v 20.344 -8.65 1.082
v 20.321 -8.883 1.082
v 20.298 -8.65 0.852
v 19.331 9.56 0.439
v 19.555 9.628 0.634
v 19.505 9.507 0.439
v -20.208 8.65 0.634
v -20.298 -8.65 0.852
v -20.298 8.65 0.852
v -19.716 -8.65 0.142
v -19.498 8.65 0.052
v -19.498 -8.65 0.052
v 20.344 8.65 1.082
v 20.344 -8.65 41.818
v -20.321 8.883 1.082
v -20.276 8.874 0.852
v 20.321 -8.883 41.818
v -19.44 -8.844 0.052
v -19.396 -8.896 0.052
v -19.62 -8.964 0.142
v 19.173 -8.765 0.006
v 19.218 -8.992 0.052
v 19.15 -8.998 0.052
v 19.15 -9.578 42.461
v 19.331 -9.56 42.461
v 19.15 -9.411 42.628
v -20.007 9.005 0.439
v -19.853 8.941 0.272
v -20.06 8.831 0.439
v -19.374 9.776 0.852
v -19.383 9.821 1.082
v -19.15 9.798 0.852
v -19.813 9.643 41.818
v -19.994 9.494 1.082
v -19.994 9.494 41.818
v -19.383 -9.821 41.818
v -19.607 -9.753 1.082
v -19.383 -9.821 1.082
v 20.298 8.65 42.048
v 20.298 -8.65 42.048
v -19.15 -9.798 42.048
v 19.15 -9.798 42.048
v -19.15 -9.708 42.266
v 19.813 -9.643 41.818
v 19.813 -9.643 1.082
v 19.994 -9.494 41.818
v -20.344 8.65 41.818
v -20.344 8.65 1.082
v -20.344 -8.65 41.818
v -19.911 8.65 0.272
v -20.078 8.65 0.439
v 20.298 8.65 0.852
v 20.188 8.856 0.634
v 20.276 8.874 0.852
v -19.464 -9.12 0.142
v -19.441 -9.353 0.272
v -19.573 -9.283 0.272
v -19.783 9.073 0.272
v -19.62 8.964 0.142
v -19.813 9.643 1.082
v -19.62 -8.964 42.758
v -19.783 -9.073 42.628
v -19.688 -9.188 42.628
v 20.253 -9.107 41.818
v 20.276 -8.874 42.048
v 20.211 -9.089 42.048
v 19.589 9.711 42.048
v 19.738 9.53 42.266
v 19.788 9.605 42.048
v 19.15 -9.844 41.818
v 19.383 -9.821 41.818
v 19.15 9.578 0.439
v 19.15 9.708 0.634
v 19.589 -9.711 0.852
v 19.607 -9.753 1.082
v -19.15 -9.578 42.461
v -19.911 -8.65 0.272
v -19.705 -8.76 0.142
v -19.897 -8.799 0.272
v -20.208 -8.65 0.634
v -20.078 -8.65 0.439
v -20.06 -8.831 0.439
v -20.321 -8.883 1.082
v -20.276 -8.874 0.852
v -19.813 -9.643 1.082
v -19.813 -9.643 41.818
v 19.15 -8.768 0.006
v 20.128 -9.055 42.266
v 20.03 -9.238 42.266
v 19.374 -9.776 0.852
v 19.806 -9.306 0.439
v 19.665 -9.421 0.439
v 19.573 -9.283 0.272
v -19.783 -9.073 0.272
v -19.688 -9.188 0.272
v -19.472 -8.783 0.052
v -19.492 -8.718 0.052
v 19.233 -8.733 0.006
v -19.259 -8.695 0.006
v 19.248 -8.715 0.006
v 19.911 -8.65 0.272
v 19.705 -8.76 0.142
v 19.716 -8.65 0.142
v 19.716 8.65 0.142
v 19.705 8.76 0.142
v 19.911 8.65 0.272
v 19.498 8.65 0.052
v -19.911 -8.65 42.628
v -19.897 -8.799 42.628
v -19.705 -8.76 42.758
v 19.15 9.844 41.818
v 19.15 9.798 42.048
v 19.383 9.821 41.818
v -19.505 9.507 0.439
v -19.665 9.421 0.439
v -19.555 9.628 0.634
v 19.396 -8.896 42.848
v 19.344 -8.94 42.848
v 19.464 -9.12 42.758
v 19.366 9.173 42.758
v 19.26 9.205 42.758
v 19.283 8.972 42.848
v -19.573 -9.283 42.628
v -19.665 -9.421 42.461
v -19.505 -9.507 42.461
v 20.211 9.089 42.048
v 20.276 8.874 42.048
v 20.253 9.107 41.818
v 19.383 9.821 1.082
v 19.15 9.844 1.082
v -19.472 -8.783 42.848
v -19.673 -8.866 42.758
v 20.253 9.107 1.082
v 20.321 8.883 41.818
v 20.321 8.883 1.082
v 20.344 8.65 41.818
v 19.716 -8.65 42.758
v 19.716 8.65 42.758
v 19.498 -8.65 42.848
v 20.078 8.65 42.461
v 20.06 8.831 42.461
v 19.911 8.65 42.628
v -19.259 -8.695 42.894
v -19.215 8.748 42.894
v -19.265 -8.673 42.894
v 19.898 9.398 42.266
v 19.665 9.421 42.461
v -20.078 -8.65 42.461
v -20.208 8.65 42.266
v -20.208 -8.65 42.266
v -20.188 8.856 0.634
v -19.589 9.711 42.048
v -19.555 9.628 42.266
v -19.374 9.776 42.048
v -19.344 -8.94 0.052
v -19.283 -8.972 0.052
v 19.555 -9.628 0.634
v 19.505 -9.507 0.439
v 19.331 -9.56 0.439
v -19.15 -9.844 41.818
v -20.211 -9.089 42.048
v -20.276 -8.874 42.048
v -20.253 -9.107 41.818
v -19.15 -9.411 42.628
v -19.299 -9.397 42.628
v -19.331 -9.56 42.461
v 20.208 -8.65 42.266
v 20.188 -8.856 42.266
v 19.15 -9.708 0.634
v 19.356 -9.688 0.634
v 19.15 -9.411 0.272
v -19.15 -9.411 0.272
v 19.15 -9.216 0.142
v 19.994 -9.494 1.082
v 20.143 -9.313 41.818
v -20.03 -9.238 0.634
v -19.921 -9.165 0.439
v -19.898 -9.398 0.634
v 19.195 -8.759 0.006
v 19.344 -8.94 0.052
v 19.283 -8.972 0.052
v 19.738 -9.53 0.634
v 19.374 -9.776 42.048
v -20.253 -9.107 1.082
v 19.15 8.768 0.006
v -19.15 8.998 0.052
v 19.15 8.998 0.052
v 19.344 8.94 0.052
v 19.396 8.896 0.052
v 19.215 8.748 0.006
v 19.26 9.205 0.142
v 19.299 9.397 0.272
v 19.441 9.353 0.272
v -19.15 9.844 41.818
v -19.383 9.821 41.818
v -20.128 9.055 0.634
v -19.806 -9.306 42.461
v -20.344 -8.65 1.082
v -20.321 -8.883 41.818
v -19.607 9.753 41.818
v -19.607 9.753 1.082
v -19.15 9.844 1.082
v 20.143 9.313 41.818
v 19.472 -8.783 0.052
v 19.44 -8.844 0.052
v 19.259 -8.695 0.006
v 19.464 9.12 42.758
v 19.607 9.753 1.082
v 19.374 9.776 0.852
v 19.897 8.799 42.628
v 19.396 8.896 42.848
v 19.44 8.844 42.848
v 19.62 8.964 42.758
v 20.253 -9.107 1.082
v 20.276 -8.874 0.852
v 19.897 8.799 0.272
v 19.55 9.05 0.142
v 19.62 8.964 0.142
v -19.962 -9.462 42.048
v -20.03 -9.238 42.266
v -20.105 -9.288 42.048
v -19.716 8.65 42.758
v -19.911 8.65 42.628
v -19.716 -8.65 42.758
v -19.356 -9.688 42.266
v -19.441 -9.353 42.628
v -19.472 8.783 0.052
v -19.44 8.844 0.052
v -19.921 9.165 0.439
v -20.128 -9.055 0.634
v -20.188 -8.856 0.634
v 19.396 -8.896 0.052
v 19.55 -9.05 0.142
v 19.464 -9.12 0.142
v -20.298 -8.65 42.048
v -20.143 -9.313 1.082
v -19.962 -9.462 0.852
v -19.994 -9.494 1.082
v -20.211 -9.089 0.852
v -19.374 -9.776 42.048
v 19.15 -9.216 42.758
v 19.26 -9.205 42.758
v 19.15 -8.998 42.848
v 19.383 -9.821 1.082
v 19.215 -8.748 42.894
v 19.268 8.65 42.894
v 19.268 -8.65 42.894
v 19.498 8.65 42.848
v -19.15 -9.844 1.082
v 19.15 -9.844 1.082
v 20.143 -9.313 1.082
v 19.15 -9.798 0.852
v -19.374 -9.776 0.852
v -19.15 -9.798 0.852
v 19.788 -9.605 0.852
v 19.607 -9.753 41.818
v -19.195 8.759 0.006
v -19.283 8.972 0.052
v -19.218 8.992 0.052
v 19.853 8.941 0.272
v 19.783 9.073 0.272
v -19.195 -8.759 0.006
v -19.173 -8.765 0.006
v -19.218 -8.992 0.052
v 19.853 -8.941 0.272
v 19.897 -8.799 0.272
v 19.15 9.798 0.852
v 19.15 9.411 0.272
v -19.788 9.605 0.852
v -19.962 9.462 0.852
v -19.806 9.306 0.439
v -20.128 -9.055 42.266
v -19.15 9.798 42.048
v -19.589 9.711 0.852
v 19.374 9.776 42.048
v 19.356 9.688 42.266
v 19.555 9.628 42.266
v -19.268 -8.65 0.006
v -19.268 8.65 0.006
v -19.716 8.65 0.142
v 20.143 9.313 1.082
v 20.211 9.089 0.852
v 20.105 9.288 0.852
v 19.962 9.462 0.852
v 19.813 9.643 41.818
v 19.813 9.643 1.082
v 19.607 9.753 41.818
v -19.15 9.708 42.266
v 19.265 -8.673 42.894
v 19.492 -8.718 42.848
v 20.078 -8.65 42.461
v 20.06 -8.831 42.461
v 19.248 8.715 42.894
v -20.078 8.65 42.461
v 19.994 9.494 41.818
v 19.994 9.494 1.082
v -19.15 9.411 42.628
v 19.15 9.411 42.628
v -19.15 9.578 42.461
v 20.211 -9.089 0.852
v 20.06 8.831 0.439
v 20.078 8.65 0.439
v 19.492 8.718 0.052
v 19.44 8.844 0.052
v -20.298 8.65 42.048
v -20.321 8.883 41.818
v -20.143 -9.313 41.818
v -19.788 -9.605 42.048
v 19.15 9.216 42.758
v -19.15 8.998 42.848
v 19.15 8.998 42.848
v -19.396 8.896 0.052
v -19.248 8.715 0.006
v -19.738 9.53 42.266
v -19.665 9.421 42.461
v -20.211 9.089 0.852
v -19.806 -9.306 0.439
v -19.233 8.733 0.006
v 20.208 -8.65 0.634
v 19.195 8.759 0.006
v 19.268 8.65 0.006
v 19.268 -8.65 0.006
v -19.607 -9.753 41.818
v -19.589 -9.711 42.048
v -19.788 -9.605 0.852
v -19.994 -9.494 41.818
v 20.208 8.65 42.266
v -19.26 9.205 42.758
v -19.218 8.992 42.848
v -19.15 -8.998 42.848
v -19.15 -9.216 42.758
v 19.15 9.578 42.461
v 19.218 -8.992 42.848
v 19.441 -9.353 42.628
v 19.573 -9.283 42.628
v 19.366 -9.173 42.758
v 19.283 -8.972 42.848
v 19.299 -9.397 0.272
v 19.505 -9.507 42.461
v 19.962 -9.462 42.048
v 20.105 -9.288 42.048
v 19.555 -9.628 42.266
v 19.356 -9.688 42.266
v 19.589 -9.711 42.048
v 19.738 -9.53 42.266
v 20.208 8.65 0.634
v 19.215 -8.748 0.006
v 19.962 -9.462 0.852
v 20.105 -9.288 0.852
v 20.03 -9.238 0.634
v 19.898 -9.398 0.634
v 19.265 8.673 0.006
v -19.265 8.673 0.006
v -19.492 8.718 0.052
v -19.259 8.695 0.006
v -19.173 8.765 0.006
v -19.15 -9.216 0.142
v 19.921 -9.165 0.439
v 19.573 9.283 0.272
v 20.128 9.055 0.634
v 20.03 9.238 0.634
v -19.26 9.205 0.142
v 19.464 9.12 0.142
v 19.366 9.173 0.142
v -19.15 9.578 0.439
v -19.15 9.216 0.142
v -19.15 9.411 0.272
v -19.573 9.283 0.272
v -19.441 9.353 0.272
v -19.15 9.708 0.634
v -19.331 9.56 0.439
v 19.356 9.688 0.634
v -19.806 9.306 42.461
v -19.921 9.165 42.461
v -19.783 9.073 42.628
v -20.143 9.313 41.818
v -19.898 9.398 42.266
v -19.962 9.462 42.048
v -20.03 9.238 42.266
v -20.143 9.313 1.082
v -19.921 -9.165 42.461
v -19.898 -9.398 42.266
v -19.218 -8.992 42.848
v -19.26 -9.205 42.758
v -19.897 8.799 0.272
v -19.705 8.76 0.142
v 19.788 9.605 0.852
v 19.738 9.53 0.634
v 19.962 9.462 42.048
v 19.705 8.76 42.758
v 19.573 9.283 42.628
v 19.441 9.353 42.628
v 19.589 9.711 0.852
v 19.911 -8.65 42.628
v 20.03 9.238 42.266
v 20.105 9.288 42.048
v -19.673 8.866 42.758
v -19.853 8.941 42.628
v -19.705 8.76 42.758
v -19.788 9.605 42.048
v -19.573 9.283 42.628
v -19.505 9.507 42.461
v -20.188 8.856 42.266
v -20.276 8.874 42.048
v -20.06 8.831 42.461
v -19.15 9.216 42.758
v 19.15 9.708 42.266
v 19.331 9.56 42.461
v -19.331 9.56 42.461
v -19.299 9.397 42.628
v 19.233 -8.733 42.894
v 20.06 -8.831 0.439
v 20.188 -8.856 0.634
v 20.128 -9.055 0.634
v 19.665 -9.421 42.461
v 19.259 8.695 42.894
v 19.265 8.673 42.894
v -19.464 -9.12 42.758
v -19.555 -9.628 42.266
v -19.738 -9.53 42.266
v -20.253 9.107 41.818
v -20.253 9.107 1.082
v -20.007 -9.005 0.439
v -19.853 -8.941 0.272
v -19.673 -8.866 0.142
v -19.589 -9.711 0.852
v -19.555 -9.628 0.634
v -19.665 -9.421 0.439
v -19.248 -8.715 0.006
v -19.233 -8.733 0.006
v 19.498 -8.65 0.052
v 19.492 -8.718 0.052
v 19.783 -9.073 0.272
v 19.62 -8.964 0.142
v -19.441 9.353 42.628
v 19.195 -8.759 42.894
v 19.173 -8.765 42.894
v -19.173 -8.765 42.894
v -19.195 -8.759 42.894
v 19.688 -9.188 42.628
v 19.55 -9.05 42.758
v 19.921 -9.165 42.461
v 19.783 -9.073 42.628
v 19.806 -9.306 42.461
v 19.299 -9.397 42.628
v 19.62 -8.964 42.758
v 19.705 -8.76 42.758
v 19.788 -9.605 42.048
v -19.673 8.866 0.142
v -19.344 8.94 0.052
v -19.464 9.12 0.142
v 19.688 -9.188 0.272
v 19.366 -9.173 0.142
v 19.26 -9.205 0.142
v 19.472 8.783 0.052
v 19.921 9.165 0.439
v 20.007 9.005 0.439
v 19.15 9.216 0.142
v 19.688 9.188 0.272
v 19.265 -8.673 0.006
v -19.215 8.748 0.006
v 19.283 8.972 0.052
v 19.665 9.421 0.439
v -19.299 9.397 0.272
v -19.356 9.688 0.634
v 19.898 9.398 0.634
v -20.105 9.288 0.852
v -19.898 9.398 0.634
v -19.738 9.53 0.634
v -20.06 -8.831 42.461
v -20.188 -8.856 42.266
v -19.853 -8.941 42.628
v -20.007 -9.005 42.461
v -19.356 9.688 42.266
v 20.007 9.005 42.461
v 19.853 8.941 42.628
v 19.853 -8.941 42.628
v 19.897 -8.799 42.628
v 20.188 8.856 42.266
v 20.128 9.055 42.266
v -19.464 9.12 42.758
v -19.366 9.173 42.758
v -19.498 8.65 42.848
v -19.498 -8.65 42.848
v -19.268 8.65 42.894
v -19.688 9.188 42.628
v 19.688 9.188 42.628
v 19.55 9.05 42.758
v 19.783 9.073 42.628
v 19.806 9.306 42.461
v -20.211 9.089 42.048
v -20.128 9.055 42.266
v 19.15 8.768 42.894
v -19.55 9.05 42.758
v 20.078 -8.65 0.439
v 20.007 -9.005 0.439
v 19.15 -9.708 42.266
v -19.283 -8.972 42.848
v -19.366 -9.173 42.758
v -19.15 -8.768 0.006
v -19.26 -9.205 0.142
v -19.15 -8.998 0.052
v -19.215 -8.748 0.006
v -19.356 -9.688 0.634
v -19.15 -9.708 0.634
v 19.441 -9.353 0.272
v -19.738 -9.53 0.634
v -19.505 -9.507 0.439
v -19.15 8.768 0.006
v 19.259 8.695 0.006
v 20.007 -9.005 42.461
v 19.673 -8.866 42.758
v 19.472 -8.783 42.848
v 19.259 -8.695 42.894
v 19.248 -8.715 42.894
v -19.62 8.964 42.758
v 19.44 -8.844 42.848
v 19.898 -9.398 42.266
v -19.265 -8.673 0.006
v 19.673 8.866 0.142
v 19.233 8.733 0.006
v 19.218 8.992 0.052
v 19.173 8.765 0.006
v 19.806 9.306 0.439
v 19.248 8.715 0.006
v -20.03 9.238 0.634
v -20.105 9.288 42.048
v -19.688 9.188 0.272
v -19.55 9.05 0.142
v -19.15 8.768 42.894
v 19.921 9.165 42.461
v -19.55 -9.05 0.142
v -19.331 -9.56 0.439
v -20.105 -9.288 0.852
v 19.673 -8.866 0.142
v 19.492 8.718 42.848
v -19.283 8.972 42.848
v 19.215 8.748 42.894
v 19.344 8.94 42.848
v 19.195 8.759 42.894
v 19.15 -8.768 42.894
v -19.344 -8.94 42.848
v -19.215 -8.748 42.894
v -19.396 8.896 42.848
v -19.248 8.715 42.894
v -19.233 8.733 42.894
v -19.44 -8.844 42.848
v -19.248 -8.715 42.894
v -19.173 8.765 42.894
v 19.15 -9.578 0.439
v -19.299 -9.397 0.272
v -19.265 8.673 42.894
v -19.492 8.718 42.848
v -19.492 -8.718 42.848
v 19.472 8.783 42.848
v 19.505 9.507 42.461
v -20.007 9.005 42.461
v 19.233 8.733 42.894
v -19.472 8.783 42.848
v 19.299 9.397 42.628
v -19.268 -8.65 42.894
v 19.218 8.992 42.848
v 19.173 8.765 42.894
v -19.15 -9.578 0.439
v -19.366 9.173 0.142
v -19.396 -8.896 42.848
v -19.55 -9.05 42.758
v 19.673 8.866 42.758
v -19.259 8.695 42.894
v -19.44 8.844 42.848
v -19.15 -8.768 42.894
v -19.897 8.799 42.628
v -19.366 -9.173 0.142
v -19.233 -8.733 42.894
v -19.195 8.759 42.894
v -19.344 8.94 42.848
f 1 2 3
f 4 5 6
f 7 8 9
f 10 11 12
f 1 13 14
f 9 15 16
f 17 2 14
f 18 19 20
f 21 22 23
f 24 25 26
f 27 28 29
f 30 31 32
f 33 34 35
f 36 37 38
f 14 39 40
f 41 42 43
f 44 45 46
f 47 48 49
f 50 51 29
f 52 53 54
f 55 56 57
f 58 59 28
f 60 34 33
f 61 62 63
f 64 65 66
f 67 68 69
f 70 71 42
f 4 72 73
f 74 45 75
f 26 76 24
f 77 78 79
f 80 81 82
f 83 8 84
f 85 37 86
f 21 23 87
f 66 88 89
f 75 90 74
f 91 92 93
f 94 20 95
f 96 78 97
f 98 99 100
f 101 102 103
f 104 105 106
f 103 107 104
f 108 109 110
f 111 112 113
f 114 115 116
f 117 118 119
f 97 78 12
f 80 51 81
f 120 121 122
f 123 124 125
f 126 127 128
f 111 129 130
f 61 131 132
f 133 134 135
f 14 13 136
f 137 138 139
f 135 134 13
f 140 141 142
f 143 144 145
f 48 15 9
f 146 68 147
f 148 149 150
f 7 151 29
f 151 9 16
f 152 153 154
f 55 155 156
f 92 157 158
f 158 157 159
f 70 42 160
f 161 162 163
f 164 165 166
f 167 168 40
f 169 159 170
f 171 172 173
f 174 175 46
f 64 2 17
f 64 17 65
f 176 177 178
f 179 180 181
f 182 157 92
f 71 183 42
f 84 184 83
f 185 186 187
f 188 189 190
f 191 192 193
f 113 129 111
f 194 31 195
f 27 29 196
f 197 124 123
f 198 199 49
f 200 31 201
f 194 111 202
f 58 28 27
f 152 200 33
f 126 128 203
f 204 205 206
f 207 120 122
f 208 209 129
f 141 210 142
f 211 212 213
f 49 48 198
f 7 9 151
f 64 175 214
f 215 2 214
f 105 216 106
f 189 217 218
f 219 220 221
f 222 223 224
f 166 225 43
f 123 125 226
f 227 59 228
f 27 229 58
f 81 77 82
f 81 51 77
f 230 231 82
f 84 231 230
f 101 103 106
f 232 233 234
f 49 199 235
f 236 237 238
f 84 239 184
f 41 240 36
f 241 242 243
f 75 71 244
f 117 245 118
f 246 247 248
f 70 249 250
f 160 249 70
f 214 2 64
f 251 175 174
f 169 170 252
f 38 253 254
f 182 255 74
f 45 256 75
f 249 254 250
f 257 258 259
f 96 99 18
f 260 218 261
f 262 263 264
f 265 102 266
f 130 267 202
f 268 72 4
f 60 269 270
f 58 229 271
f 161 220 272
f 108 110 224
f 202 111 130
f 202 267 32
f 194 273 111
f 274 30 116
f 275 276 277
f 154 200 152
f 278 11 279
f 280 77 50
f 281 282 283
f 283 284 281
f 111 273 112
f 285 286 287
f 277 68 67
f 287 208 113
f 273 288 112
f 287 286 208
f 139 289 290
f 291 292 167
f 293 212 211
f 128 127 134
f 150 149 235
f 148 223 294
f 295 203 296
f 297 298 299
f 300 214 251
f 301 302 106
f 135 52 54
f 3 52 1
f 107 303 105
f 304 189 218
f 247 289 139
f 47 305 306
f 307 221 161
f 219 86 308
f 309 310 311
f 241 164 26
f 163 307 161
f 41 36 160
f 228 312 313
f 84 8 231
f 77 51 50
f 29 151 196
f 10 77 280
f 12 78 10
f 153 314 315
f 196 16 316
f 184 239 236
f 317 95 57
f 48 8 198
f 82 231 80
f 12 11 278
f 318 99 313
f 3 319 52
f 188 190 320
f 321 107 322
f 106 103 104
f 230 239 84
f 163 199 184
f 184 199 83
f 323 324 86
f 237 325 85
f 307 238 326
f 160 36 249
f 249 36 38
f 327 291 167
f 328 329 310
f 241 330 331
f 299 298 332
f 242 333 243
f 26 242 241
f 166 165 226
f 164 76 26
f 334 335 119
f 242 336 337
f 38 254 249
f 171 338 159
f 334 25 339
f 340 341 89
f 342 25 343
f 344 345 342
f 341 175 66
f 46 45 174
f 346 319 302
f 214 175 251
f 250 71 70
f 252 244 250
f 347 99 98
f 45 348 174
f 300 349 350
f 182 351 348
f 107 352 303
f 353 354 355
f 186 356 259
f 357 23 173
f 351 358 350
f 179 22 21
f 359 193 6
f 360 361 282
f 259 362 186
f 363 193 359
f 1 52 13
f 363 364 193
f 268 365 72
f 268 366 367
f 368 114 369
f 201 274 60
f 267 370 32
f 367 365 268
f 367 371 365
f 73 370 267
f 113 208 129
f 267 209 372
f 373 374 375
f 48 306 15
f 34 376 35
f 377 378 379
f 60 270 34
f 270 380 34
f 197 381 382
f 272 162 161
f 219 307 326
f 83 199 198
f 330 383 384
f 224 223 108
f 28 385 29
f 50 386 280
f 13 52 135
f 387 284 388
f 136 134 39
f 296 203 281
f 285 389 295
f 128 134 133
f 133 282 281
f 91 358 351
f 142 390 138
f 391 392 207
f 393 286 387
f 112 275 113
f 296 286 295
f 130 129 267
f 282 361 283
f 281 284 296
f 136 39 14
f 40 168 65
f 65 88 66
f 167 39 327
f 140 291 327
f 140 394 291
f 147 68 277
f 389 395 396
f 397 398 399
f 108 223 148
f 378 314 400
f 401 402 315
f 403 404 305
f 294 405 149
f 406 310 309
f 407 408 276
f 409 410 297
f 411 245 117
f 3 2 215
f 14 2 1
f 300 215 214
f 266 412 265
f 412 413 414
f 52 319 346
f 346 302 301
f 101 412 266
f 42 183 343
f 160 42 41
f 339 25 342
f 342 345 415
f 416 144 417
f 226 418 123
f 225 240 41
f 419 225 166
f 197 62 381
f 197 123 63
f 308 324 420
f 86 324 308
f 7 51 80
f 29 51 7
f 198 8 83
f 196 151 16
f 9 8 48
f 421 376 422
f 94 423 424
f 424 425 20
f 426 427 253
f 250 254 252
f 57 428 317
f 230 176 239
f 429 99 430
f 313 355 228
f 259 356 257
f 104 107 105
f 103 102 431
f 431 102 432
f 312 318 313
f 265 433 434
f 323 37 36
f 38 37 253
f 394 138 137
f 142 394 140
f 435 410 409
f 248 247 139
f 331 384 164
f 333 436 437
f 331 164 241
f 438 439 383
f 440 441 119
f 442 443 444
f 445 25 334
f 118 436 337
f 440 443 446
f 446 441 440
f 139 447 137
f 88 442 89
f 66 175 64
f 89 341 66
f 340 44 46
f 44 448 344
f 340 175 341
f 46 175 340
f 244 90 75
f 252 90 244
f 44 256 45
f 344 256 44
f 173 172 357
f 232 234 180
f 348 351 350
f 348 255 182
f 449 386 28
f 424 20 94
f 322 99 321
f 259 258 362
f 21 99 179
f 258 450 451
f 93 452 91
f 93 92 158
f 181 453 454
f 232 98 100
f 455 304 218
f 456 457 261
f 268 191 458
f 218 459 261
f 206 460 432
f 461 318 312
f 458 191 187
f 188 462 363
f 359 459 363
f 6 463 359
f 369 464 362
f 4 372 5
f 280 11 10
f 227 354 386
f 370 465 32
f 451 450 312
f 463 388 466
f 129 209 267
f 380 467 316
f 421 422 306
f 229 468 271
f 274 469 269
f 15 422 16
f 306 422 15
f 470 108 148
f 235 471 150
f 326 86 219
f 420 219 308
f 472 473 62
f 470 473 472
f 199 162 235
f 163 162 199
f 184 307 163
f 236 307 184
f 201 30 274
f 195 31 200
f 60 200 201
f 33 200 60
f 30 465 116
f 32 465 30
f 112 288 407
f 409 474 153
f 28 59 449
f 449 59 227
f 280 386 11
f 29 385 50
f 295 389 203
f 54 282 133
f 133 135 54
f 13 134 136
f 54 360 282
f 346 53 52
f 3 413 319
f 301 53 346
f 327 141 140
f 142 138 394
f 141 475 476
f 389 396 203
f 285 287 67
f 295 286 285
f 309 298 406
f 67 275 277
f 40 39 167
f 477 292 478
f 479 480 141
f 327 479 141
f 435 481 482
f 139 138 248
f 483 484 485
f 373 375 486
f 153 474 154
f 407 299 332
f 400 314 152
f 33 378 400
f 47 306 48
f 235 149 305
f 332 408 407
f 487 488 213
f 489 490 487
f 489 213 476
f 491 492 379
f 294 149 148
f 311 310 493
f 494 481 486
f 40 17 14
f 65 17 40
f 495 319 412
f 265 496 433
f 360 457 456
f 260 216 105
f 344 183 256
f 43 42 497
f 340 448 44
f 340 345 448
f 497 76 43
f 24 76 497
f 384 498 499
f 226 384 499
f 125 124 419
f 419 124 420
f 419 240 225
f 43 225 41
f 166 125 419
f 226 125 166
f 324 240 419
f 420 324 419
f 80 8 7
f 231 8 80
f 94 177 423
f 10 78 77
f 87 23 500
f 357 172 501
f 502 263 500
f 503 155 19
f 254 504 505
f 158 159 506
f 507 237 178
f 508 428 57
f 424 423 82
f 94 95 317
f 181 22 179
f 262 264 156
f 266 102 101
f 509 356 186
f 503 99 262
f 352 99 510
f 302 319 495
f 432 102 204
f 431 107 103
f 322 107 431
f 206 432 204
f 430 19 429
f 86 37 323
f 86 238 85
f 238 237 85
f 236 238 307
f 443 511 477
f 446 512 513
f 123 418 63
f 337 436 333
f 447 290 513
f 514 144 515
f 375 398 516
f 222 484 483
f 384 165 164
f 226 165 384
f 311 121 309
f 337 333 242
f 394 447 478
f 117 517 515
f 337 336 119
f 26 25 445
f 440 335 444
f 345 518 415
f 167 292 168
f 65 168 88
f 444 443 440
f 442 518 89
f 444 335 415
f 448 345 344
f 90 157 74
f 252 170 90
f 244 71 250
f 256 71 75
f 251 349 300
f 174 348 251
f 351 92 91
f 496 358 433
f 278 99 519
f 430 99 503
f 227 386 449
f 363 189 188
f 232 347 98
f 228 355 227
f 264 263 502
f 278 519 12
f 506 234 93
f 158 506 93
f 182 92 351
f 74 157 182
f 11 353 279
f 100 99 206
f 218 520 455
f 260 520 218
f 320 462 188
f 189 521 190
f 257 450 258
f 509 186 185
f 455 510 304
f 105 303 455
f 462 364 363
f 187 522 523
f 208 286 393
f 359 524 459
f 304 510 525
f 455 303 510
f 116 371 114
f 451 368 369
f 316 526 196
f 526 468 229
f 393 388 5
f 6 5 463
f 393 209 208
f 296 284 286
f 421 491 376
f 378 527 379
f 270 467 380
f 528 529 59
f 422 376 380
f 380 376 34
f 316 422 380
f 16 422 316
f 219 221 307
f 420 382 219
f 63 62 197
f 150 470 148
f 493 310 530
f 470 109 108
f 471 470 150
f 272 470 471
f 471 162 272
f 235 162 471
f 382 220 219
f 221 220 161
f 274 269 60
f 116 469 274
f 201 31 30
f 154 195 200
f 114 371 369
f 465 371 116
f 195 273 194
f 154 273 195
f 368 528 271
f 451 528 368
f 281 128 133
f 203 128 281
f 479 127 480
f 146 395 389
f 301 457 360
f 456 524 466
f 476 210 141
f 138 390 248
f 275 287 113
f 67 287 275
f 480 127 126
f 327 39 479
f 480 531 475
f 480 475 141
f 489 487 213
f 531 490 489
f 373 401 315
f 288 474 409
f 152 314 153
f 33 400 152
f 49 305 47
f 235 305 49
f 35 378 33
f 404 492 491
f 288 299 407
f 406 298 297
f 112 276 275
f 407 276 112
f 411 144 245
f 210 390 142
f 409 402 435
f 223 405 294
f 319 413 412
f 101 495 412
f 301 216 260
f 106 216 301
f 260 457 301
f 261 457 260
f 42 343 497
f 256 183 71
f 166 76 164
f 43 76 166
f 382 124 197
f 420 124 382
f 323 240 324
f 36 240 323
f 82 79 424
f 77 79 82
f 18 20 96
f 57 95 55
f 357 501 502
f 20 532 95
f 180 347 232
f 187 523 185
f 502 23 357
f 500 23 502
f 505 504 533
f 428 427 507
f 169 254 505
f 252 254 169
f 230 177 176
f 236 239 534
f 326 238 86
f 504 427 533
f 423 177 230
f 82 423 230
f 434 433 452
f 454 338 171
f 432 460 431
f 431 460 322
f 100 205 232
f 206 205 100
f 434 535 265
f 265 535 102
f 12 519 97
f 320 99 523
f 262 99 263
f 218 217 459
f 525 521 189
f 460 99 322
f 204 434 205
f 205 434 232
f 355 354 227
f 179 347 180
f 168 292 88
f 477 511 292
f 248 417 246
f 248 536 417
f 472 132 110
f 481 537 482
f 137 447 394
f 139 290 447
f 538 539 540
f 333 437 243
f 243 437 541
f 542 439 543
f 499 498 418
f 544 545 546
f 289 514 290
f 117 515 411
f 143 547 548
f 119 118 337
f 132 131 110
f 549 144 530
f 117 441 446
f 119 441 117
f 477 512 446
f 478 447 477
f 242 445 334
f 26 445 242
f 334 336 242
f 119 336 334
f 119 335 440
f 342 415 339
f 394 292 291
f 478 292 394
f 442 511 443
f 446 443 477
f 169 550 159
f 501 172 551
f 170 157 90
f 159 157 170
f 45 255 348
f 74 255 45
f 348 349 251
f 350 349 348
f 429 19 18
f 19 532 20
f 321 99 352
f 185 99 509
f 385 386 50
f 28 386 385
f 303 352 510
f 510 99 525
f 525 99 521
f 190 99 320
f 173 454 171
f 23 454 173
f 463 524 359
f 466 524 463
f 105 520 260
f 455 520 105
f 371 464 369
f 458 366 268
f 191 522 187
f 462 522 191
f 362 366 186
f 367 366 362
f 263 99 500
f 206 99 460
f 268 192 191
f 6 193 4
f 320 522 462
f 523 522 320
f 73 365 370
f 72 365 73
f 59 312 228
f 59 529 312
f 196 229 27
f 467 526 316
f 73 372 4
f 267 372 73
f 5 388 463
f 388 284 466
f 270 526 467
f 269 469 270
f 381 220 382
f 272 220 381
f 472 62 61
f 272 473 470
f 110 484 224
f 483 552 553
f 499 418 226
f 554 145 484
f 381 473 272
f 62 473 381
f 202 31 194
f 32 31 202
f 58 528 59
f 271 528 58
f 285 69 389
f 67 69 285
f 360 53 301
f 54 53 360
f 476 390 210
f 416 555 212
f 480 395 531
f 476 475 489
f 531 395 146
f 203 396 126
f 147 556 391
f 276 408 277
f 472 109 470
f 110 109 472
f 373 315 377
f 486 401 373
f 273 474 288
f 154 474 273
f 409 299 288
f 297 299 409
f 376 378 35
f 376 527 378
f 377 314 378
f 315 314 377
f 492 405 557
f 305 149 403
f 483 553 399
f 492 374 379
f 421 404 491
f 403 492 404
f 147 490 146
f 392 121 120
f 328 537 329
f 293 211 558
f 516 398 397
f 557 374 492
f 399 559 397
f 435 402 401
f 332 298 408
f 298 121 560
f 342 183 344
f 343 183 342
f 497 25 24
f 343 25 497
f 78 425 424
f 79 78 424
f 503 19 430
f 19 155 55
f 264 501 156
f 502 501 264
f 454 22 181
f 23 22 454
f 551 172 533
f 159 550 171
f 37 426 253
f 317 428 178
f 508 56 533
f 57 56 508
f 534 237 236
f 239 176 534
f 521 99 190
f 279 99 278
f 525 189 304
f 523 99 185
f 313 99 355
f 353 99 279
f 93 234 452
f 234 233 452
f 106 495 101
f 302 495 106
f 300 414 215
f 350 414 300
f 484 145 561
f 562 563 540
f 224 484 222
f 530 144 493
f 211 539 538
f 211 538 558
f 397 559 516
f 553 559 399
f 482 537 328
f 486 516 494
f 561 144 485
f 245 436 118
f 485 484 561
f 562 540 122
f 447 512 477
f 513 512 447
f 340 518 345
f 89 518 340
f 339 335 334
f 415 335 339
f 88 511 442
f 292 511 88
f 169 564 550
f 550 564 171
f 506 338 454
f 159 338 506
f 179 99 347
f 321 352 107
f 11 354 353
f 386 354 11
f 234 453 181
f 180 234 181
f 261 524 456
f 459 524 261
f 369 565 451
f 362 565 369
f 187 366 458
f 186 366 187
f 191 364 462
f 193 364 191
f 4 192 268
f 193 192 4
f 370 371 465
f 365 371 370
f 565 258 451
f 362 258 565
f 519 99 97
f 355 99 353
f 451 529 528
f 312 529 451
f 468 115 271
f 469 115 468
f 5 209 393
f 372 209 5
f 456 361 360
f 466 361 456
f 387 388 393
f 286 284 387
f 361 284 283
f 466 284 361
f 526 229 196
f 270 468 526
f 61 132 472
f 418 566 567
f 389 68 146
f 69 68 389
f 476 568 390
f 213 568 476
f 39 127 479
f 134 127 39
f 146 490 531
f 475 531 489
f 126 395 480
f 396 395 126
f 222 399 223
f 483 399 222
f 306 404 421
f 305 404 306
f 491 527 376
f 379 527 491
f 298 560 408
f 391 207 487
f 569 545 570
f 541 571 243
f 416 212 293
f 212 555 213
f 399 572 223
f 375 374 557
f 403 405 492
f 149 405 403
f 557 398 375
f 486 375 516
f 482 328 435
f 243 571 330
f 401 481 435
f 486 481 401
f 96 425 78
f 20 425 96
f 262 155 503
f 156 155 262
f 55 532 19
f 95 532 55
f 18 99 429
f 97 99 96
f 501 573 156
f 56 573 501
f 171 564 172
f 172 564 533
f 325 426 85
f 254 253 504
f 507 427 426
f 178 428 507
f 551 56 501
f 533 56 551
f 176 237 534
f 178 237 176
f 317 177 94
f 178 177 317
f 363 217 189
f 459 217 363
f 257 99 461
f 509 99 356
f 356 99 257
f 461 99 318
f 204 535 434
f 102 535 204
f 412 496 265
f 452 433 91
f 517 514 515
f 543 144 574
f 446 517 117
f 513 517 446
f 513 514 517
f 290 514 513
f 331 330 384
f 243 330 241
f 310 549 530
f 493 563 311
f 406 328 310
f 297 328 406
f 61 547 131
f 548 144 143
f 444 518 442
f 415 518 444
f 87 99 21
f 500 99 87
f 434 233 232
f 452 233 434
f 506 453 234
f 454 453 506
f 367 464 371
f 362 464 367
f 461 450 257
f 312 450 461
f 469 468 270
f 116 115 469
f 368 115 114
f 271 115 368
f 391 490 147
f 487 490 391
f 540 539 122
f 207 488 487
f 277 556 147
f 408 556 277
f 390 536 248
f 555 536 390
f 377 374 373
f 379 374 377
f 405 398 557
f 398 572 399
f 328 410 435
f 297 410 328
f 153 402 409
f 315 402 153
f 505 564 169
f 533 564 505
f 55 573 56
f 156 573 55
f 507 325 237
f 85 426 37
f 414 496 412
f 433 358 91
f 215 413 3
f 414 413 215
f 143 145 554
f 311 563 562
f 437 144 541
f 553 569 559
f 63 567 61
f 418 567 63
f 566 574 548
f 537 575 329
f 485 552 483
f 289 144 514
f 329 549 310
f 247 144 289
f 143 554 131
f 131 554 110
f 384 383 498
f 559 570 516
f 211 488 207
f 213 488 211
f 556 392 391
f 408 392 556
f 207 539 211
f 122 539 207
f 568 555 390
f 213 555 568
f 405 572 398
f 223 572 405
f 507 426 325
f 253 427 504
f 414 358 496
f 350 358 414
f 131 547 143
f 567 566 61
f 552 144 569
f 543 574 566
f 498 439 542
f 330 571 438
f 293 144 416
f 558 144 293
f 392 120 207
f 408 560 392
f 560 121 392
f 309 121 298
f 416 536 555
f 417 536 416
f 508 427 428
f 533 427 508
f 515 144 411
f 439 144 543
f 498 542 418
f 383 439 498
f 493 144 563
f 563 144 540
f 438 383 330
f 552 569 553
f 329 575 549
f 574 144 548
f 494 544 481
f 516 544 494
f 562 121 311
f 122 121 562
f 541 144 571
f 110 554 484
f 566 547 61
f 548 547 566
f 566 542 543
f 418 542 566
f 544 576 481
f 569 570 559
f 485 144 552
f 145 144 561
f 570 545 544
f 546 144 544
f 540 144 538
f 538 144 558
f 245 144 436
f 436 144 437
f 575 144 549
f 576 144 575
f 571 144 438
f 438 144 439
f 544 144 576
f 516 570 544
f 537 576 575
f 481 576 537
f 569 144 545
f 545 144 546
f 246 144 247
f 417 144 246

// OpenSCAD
// MG996R (MG996R 伺服馬達) visual source for NexCAD.
// Units: millimeters. Origin: part bottom-center, matching src/parts/library.ts.
// This generated baseline is intentionally simple; refine it with measured details before exporting STL.

$fn = 32;

module rounded_box(size, r = 0.8) {
  hull() {
    for (x = [-size[0] / 2 + r, size[0] / 2 - r])
      for (y = [-size[1] / 2 + r, size[1] / 2 - r]) {
        translate([x, y, r]) sphere(r = r);
        translate([x, y, size[2] - r]) sphere(r = r);
      }
  }
}

color("#2e7d5b") rounded_box([40.7, 19.7, 42.9], min(1.2, min(40.7, 19.7) / 8));
